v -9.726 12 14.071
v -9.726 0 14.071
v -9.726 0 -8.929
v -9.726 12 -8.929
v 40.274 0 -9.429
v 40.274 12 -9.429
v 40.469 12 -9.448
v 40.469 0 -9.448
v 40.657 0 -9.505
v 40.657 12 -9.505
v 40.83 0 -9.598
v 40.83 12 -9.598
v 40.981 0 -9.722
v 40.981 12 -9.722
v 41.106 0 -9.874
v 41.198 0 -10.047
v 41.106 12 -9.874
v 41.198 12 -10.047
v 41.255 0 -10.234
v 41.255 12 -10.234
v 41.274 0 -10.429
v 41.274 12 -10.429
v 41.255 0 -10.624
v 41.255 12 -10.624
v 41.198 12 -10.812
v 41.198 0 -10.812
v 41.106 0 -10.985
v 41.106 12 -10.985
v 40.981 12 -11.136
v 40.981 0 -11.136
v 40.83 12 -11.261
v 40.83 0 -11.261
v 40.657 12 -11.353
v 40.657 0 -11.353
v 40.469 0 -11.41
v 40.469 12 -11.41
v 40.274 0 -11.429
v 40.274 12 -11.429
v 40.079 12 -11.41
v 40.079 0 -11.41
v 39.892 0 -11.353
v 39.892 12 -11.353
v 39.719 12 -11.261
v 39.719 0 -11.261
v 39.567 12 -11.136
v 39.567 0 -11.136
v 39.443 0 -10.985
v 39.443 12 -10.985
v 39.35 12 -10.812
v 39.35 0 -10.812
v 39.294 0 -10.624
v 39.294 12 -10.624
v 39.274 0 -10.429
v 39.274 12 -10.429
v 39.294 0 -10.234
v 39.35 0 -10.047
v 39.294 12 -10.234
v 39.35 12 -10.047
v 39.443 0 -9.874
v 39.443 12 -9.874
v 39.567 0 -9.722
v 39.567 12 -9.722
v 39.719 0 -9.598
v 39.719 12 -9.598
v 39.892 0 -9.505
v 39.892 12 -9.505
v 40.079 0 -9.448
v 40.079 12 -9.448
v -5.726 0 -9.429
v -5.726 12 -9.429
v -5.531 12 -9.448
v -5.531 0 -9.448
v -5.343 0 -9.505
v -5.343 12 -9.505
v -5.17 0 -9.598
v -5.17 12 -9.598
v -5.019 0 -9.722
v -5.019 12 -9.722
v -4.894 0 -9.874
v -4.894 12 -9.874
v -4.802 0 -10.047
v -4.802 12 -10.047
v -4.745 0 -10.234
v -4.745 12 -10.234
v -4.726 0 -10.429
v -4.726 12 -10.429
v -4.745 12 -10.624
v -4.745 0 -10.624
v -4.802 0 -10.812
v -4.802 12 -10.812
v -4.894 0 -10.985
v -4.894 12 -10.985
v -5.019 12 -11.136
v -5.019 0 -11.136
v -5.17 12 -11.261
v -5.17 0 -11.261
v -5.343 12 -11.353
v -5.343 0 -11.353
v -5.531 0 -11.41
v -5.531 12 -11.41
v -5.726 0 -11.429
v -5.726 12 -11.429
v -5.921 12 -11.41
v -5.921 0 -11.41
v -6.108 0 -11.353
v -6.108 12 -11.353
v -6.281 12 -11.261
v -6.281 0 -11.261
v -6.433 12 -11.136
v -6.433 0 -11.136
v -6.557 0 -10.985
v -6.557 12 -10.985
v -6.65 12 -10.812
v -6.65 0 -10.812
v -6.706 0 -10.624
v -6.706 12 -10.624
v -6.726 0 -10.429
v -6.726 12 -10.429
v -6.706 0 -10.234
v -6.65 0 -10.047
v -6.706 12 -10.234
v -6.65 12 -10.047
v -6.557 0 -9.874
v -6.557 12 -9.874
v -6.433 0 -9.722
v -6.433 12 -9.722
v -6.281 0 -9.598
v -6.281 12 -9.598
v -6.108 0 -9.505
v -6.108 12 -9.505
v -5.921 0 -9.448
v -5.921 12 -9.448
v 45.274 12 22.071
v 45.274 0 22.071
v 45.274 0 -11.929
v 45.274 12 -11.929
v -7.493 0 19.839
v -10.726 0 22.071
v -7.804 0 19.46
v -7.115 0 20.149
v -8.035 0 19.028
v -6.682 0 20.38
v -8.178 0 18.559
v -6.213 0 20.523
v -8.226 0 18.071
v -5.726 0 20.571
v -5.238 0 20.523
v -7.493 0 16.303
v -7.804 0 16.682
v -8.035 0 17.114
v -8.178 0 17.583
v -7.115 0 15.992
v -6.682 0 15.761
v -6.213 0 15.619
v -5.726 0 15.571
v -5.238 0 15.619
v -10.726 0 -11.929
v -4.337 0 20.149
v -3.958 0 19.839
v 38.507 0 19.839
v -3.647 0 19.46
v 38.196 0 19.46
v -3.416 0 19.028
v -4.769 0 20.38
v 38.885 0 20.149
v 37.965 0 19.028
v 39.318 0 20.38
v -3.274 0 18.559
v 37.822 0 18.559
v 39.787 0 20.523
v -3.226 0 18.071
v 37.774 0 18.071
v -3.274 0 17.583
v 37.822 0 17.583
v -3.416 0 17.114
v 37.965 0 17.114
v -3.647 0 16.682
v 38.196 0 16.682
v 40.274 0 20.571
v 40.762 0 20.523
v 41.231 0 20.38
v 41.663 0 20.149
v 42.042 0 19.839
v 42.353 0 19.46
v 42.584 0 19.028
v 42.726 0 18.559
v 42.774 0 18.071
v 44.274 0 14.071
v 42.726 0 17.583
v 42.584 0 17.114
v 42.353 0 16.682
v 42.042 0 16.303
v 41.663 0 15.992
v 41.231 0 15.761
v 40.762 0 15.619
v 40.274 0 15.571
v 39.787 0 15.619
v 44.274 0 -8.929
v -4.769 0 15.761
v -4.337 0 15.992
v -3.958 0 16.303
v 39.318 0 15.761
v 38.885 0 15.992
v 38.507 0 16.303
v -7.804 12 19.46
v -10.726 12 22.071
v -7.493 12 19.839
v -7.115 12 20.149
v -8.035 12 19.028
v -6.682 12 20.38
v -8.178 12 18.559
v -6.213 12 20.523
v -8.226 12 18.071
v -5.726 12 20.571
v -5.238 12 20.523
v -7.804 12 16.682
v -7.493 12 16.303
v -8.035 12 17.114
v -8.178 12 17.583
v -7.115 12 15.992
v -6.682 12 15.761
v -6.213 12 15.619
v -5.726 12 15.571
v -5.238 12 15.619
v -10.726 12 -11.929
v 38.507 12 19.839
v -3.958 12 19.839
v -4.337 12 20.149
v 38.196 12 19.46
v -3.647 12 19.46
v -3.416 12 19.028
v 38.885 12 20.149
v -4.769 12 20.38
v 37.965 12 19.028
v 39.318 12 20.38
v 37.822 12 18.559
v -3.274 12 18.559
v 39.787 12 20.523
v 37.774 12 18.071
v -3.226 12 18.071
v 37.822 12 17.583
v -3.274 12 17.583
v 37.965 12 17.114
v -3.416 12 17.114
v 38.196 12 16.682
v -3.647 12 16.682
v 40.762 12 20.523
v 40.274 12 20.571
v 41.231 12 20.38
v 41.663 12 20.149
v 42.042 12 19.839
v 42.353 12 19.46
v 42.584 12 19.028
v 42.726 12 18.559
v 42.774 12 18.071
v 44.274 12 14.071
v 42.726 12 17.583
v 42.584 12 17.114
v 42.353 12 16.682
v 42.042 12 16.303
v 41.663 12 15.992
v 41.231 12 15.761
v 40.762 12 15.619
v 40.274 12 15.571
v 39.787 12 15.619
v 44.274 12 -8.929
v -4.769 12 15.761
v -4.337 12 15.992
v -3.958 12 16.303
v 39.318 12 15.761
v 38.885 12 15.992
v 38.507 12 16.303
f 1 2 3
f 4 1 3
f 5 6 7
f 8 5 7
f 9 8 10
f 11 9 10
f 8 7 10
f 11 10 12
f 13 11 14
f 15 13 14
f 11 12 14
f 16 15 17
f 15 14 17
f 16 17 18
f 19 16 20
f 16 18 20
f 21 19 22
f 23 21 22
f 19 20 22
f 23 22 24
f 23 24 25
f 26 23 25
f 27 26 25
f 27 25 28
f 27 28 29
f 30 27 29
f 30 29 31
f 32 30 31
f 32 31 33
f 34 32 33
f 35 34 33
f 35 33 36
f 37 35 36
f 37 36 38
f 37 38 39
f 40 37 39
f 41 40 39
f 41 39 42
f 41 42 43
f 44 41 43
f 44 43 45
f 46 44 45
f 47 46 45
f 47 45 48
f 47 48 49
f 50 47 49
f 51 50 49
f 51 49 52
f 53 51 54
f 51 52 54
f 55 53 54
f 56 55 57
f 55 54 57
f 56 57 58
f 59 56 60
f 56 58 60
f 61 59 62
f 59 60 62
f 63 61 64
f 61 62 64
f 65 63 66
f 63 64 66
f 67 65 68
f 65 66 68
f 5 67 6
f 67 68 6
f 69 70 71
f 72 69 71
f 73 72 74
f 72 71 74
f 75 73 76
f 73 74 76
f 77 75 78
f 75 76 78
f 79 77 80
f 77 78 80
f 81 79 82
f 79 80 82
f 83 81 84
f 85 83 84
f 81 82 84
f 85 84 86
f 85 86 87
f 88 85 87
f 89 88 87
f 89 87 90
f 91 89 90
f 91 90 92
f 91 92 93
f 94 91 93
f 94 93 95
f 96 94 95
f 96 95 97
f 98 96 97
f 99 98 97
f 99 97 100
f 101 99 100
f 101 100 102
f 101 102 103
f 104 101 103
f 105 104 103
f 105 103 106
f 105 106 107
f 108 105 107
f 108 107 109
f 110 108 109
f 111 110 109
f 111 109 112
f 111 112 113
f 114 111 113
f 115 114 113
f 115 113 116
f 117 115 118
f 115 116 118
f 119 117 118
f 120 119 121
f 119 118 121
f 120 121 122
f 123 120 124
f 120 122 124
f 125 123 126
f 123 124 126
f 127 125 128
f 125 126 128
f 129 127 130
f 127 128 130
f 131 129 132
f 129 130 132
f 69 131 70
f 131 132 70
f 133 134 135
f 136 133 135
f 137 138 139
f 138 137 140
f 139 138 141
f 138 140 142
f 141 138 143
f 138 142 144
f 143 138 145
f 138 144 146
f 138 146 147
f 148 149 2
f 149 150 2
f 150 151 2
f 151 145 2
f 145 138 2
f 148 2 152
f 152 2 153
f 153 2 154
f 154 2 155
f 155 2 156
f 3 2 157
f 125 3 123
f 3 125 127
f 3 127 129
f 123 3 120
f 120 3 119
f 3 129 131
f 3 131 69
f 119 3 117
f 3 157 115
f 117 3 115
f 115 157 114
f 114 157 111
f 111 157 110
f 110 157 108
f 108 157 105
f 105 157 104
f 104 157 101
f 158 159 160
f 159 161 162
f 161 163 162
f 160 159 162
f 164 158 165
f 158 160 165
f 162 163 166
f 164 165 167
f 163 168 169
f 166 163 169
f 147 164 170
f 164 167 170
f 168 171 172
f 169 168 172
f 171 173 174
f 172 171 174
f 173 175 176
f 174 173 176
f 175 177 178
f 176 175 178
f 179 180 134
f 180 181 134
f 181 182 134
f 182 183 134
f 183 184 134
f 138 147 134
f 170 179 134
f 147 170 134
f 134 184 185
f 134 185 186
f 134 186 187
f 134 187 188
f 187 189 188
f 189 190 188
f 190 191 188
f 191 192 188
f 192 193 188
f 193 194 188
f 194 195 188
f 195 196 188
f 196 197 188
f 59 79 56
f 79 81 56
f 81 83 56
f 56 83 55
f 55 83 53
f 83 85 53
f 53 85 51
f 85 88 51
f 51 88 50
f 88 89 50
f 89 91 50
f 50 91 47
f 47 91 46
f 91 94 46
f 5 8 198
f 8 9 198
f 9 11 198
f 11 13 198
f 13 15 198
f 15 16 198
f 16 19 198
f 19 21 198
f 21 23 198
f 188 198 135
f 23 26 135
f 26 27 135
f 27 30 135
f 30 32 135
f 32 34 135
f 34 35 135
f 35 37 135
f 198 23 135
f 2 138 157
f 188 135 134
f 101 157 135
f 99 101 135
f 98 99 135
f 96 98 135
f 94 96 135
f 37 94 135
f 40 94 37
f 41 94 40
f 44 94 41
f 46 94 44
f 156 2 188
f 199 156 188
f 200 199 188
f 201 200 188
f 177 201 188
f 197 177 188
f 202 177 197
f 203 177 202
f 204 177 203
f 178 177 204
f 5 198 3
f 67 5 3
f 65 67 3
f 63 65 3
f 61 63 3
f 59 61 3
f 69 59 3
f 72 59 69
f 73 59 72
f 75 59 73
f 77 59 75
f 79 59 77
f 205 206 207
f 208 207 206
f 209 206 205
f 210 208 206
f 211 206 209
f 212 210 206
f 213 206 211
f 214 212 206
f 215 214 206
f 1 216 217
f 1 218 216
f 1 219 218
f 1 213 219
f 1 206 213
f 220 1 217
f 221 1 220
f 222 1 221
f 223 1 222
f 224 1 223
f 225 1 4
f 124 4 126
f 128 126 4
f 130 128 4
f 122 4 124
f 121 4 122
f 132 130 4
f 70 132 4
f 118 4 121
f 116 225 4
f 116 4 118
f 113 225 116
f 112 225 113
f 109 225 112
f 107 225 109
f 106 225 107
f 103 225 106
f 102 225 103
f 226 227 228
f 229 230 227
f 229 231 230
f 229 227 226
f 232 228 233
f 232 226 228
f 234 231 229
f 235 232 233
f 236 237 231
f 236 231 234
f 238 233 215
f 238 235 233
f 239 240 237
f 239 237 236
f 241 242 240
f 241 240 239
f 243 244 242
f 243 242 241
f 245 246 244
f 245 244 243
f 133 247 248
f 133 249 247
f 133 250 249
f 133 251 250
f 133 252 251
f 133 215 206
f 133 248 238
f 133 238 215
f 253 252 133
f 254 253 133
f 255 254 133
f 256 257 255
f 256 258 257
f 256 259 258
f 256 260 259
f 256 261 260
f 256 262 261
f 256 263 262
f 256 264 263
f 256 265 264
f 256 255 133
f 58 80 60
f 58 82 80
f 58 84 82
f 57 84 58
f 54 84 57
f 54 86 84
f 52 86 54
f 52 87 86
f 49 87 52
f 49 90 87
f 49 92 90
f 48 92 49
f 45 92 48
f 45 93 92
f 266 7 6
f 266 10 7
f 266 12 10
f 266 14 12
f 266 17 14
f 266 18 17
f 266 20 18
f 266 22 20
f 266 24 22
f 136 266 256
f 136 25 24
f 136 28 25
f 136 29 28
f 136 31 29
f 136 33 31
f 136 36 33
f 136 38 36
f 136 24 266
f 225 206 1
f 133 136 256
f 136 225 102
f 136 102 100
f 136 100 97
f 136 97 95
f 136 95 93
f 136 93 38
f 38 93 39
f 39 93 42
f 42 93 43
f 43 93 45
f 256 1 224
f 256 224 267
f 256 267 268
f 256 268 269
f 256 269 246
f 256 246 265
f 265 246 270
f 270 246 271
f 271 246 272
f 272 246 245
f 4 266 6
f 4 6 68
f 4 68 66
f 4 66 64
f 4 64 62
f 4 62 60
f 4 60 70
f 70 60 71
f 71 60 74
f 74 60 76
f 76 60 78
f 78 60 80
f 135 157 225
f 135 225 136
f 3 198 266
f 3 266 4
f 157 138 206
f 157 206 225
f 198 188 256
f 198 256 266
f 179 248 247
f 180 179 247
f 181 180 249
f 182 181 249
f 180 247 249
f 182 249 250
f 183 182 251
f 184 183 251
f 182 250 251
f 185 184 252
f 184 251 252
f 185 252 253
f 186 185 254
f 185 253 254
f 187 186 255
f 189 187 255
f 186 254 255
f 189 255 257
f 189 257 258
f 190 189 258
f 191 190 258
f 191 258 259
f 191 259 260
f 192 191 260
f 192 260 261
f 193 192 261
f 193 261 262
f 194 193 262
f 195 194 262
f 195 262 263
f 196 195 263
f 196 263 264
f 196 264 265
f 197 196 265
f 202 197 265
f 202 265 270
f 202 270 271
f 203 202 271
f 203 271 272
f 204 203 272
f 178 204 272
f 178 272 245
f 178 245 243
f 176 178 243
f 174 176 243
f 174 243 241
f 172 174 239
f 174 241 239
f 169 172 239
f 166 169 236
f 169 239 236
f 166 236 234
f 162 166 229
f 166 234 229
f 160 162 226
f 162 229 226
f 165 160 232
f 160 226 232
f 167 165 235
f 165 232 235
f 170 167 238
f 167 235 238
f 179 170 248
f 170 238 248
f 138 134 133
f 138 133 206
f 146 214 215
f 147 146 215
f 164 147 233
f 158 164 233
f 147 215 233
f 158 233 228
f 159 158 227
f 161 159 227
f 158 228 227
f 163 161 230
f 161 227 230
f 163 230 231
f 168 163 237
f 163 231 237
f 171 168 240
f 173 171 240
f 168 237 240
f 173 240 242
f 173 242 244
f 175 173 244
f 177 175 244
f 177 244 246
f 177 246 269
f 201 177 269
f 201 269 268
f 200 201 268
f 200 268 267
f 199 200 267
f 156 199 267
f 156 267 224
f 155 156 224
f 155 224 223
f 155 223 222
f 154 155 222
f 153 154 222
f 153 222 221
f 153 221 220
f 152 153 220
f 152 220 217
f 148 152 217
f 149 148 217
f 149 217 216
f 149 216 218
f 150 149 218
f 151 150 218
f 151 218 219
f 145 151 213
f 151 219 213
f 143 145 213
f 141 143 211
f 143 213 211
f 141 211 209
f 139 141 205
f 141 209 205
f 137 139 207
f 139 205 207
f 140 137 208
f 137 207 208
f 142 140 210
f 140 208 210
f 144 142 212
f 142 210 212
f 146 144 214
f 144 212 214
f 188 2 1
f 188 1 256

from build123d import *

# Parameters (mm, degrees)
EXTRUDE_1_DEPTH     = 12
SKETCH_4_W          = 56
SKETCH_4_H          = 2
EXTRUDE_2_DEPTH     = 12
SKETCH_3_R          = 2.5
SKETCH_3_R_2        = 1
CUT_EXTRUDE_1_DEPTH = 52.777268973


with BuildPart() as part:
    # 草图2 → 凸台-拉伸1 (new body)
    with BuildSketch(Plane(origin=(0, 0, 0), x_dir=(1, 0, 0), z_dir=(0, 1, 0))):
        Polygon((-10.725663717, 9.92920354), (45.274336283, 9.92920354), (45.274336283, -22.07079646), (-10.725663717, -22.07079646), (-10.725663717, -7.07079646), (-10.725663717, 1.92920354), align=None)
        Polygon((-9.725663717, -7.07079646), (-9.725663717, -14.07079646), (44.274336283, -14.07079646), (44.274336283, 8.92920354), (-9.725663717, 8.92920354), (-9.725663717, 0.92920354), align=None, mode=Mode.SUBTRACT)
    extrude(amount=EXTRUDE_1_DEPTH)

    # 草图4 → 凸台-拉伸2 (add)
    with BuildSketch(Plane(origin=(0, 0, 0), x_dir=(1, 0, 0), z_dir=(0, 1, 0))):
        with Locations((17.274336283, 10.92920354)):
            Rectangle(SKETCH_4_W, SKETCH_4_H)
    extrude(amount=EXTRUDE_2_DEPTH)

    # 草图3 → 切除-拉伸1 (cut, through all)
    with BuildSketch(Plane(origin=(0, 12, 0), x_dir=(1, 0, 0), z_dir=(0, 1, 0))):
        with Locations(Location((-5.725663717, -18.07079646, 0), (0, 0, 270))):
            Circle(SKETCH_3_R)
        with Locations(Location((40.274336283, -18.07079646, 0), (0, 0, 270))):
            Circle(SKETCH_3_R)
        with Locations(Location((-5.725663717, 10.42920354, 0), (0, 0, 270))):
            Circle(SKETCH_3_R_2)
        with Locations(Location((40.274336283, 10.42920354, 0), (0, 0, 270))):
            Circle(SKETCH_3_R_2)
    extrude(amount=-CUT_EXTRUDE_1_DEPTH, mode=Mode.SUBTRACT)


solid = part.part
